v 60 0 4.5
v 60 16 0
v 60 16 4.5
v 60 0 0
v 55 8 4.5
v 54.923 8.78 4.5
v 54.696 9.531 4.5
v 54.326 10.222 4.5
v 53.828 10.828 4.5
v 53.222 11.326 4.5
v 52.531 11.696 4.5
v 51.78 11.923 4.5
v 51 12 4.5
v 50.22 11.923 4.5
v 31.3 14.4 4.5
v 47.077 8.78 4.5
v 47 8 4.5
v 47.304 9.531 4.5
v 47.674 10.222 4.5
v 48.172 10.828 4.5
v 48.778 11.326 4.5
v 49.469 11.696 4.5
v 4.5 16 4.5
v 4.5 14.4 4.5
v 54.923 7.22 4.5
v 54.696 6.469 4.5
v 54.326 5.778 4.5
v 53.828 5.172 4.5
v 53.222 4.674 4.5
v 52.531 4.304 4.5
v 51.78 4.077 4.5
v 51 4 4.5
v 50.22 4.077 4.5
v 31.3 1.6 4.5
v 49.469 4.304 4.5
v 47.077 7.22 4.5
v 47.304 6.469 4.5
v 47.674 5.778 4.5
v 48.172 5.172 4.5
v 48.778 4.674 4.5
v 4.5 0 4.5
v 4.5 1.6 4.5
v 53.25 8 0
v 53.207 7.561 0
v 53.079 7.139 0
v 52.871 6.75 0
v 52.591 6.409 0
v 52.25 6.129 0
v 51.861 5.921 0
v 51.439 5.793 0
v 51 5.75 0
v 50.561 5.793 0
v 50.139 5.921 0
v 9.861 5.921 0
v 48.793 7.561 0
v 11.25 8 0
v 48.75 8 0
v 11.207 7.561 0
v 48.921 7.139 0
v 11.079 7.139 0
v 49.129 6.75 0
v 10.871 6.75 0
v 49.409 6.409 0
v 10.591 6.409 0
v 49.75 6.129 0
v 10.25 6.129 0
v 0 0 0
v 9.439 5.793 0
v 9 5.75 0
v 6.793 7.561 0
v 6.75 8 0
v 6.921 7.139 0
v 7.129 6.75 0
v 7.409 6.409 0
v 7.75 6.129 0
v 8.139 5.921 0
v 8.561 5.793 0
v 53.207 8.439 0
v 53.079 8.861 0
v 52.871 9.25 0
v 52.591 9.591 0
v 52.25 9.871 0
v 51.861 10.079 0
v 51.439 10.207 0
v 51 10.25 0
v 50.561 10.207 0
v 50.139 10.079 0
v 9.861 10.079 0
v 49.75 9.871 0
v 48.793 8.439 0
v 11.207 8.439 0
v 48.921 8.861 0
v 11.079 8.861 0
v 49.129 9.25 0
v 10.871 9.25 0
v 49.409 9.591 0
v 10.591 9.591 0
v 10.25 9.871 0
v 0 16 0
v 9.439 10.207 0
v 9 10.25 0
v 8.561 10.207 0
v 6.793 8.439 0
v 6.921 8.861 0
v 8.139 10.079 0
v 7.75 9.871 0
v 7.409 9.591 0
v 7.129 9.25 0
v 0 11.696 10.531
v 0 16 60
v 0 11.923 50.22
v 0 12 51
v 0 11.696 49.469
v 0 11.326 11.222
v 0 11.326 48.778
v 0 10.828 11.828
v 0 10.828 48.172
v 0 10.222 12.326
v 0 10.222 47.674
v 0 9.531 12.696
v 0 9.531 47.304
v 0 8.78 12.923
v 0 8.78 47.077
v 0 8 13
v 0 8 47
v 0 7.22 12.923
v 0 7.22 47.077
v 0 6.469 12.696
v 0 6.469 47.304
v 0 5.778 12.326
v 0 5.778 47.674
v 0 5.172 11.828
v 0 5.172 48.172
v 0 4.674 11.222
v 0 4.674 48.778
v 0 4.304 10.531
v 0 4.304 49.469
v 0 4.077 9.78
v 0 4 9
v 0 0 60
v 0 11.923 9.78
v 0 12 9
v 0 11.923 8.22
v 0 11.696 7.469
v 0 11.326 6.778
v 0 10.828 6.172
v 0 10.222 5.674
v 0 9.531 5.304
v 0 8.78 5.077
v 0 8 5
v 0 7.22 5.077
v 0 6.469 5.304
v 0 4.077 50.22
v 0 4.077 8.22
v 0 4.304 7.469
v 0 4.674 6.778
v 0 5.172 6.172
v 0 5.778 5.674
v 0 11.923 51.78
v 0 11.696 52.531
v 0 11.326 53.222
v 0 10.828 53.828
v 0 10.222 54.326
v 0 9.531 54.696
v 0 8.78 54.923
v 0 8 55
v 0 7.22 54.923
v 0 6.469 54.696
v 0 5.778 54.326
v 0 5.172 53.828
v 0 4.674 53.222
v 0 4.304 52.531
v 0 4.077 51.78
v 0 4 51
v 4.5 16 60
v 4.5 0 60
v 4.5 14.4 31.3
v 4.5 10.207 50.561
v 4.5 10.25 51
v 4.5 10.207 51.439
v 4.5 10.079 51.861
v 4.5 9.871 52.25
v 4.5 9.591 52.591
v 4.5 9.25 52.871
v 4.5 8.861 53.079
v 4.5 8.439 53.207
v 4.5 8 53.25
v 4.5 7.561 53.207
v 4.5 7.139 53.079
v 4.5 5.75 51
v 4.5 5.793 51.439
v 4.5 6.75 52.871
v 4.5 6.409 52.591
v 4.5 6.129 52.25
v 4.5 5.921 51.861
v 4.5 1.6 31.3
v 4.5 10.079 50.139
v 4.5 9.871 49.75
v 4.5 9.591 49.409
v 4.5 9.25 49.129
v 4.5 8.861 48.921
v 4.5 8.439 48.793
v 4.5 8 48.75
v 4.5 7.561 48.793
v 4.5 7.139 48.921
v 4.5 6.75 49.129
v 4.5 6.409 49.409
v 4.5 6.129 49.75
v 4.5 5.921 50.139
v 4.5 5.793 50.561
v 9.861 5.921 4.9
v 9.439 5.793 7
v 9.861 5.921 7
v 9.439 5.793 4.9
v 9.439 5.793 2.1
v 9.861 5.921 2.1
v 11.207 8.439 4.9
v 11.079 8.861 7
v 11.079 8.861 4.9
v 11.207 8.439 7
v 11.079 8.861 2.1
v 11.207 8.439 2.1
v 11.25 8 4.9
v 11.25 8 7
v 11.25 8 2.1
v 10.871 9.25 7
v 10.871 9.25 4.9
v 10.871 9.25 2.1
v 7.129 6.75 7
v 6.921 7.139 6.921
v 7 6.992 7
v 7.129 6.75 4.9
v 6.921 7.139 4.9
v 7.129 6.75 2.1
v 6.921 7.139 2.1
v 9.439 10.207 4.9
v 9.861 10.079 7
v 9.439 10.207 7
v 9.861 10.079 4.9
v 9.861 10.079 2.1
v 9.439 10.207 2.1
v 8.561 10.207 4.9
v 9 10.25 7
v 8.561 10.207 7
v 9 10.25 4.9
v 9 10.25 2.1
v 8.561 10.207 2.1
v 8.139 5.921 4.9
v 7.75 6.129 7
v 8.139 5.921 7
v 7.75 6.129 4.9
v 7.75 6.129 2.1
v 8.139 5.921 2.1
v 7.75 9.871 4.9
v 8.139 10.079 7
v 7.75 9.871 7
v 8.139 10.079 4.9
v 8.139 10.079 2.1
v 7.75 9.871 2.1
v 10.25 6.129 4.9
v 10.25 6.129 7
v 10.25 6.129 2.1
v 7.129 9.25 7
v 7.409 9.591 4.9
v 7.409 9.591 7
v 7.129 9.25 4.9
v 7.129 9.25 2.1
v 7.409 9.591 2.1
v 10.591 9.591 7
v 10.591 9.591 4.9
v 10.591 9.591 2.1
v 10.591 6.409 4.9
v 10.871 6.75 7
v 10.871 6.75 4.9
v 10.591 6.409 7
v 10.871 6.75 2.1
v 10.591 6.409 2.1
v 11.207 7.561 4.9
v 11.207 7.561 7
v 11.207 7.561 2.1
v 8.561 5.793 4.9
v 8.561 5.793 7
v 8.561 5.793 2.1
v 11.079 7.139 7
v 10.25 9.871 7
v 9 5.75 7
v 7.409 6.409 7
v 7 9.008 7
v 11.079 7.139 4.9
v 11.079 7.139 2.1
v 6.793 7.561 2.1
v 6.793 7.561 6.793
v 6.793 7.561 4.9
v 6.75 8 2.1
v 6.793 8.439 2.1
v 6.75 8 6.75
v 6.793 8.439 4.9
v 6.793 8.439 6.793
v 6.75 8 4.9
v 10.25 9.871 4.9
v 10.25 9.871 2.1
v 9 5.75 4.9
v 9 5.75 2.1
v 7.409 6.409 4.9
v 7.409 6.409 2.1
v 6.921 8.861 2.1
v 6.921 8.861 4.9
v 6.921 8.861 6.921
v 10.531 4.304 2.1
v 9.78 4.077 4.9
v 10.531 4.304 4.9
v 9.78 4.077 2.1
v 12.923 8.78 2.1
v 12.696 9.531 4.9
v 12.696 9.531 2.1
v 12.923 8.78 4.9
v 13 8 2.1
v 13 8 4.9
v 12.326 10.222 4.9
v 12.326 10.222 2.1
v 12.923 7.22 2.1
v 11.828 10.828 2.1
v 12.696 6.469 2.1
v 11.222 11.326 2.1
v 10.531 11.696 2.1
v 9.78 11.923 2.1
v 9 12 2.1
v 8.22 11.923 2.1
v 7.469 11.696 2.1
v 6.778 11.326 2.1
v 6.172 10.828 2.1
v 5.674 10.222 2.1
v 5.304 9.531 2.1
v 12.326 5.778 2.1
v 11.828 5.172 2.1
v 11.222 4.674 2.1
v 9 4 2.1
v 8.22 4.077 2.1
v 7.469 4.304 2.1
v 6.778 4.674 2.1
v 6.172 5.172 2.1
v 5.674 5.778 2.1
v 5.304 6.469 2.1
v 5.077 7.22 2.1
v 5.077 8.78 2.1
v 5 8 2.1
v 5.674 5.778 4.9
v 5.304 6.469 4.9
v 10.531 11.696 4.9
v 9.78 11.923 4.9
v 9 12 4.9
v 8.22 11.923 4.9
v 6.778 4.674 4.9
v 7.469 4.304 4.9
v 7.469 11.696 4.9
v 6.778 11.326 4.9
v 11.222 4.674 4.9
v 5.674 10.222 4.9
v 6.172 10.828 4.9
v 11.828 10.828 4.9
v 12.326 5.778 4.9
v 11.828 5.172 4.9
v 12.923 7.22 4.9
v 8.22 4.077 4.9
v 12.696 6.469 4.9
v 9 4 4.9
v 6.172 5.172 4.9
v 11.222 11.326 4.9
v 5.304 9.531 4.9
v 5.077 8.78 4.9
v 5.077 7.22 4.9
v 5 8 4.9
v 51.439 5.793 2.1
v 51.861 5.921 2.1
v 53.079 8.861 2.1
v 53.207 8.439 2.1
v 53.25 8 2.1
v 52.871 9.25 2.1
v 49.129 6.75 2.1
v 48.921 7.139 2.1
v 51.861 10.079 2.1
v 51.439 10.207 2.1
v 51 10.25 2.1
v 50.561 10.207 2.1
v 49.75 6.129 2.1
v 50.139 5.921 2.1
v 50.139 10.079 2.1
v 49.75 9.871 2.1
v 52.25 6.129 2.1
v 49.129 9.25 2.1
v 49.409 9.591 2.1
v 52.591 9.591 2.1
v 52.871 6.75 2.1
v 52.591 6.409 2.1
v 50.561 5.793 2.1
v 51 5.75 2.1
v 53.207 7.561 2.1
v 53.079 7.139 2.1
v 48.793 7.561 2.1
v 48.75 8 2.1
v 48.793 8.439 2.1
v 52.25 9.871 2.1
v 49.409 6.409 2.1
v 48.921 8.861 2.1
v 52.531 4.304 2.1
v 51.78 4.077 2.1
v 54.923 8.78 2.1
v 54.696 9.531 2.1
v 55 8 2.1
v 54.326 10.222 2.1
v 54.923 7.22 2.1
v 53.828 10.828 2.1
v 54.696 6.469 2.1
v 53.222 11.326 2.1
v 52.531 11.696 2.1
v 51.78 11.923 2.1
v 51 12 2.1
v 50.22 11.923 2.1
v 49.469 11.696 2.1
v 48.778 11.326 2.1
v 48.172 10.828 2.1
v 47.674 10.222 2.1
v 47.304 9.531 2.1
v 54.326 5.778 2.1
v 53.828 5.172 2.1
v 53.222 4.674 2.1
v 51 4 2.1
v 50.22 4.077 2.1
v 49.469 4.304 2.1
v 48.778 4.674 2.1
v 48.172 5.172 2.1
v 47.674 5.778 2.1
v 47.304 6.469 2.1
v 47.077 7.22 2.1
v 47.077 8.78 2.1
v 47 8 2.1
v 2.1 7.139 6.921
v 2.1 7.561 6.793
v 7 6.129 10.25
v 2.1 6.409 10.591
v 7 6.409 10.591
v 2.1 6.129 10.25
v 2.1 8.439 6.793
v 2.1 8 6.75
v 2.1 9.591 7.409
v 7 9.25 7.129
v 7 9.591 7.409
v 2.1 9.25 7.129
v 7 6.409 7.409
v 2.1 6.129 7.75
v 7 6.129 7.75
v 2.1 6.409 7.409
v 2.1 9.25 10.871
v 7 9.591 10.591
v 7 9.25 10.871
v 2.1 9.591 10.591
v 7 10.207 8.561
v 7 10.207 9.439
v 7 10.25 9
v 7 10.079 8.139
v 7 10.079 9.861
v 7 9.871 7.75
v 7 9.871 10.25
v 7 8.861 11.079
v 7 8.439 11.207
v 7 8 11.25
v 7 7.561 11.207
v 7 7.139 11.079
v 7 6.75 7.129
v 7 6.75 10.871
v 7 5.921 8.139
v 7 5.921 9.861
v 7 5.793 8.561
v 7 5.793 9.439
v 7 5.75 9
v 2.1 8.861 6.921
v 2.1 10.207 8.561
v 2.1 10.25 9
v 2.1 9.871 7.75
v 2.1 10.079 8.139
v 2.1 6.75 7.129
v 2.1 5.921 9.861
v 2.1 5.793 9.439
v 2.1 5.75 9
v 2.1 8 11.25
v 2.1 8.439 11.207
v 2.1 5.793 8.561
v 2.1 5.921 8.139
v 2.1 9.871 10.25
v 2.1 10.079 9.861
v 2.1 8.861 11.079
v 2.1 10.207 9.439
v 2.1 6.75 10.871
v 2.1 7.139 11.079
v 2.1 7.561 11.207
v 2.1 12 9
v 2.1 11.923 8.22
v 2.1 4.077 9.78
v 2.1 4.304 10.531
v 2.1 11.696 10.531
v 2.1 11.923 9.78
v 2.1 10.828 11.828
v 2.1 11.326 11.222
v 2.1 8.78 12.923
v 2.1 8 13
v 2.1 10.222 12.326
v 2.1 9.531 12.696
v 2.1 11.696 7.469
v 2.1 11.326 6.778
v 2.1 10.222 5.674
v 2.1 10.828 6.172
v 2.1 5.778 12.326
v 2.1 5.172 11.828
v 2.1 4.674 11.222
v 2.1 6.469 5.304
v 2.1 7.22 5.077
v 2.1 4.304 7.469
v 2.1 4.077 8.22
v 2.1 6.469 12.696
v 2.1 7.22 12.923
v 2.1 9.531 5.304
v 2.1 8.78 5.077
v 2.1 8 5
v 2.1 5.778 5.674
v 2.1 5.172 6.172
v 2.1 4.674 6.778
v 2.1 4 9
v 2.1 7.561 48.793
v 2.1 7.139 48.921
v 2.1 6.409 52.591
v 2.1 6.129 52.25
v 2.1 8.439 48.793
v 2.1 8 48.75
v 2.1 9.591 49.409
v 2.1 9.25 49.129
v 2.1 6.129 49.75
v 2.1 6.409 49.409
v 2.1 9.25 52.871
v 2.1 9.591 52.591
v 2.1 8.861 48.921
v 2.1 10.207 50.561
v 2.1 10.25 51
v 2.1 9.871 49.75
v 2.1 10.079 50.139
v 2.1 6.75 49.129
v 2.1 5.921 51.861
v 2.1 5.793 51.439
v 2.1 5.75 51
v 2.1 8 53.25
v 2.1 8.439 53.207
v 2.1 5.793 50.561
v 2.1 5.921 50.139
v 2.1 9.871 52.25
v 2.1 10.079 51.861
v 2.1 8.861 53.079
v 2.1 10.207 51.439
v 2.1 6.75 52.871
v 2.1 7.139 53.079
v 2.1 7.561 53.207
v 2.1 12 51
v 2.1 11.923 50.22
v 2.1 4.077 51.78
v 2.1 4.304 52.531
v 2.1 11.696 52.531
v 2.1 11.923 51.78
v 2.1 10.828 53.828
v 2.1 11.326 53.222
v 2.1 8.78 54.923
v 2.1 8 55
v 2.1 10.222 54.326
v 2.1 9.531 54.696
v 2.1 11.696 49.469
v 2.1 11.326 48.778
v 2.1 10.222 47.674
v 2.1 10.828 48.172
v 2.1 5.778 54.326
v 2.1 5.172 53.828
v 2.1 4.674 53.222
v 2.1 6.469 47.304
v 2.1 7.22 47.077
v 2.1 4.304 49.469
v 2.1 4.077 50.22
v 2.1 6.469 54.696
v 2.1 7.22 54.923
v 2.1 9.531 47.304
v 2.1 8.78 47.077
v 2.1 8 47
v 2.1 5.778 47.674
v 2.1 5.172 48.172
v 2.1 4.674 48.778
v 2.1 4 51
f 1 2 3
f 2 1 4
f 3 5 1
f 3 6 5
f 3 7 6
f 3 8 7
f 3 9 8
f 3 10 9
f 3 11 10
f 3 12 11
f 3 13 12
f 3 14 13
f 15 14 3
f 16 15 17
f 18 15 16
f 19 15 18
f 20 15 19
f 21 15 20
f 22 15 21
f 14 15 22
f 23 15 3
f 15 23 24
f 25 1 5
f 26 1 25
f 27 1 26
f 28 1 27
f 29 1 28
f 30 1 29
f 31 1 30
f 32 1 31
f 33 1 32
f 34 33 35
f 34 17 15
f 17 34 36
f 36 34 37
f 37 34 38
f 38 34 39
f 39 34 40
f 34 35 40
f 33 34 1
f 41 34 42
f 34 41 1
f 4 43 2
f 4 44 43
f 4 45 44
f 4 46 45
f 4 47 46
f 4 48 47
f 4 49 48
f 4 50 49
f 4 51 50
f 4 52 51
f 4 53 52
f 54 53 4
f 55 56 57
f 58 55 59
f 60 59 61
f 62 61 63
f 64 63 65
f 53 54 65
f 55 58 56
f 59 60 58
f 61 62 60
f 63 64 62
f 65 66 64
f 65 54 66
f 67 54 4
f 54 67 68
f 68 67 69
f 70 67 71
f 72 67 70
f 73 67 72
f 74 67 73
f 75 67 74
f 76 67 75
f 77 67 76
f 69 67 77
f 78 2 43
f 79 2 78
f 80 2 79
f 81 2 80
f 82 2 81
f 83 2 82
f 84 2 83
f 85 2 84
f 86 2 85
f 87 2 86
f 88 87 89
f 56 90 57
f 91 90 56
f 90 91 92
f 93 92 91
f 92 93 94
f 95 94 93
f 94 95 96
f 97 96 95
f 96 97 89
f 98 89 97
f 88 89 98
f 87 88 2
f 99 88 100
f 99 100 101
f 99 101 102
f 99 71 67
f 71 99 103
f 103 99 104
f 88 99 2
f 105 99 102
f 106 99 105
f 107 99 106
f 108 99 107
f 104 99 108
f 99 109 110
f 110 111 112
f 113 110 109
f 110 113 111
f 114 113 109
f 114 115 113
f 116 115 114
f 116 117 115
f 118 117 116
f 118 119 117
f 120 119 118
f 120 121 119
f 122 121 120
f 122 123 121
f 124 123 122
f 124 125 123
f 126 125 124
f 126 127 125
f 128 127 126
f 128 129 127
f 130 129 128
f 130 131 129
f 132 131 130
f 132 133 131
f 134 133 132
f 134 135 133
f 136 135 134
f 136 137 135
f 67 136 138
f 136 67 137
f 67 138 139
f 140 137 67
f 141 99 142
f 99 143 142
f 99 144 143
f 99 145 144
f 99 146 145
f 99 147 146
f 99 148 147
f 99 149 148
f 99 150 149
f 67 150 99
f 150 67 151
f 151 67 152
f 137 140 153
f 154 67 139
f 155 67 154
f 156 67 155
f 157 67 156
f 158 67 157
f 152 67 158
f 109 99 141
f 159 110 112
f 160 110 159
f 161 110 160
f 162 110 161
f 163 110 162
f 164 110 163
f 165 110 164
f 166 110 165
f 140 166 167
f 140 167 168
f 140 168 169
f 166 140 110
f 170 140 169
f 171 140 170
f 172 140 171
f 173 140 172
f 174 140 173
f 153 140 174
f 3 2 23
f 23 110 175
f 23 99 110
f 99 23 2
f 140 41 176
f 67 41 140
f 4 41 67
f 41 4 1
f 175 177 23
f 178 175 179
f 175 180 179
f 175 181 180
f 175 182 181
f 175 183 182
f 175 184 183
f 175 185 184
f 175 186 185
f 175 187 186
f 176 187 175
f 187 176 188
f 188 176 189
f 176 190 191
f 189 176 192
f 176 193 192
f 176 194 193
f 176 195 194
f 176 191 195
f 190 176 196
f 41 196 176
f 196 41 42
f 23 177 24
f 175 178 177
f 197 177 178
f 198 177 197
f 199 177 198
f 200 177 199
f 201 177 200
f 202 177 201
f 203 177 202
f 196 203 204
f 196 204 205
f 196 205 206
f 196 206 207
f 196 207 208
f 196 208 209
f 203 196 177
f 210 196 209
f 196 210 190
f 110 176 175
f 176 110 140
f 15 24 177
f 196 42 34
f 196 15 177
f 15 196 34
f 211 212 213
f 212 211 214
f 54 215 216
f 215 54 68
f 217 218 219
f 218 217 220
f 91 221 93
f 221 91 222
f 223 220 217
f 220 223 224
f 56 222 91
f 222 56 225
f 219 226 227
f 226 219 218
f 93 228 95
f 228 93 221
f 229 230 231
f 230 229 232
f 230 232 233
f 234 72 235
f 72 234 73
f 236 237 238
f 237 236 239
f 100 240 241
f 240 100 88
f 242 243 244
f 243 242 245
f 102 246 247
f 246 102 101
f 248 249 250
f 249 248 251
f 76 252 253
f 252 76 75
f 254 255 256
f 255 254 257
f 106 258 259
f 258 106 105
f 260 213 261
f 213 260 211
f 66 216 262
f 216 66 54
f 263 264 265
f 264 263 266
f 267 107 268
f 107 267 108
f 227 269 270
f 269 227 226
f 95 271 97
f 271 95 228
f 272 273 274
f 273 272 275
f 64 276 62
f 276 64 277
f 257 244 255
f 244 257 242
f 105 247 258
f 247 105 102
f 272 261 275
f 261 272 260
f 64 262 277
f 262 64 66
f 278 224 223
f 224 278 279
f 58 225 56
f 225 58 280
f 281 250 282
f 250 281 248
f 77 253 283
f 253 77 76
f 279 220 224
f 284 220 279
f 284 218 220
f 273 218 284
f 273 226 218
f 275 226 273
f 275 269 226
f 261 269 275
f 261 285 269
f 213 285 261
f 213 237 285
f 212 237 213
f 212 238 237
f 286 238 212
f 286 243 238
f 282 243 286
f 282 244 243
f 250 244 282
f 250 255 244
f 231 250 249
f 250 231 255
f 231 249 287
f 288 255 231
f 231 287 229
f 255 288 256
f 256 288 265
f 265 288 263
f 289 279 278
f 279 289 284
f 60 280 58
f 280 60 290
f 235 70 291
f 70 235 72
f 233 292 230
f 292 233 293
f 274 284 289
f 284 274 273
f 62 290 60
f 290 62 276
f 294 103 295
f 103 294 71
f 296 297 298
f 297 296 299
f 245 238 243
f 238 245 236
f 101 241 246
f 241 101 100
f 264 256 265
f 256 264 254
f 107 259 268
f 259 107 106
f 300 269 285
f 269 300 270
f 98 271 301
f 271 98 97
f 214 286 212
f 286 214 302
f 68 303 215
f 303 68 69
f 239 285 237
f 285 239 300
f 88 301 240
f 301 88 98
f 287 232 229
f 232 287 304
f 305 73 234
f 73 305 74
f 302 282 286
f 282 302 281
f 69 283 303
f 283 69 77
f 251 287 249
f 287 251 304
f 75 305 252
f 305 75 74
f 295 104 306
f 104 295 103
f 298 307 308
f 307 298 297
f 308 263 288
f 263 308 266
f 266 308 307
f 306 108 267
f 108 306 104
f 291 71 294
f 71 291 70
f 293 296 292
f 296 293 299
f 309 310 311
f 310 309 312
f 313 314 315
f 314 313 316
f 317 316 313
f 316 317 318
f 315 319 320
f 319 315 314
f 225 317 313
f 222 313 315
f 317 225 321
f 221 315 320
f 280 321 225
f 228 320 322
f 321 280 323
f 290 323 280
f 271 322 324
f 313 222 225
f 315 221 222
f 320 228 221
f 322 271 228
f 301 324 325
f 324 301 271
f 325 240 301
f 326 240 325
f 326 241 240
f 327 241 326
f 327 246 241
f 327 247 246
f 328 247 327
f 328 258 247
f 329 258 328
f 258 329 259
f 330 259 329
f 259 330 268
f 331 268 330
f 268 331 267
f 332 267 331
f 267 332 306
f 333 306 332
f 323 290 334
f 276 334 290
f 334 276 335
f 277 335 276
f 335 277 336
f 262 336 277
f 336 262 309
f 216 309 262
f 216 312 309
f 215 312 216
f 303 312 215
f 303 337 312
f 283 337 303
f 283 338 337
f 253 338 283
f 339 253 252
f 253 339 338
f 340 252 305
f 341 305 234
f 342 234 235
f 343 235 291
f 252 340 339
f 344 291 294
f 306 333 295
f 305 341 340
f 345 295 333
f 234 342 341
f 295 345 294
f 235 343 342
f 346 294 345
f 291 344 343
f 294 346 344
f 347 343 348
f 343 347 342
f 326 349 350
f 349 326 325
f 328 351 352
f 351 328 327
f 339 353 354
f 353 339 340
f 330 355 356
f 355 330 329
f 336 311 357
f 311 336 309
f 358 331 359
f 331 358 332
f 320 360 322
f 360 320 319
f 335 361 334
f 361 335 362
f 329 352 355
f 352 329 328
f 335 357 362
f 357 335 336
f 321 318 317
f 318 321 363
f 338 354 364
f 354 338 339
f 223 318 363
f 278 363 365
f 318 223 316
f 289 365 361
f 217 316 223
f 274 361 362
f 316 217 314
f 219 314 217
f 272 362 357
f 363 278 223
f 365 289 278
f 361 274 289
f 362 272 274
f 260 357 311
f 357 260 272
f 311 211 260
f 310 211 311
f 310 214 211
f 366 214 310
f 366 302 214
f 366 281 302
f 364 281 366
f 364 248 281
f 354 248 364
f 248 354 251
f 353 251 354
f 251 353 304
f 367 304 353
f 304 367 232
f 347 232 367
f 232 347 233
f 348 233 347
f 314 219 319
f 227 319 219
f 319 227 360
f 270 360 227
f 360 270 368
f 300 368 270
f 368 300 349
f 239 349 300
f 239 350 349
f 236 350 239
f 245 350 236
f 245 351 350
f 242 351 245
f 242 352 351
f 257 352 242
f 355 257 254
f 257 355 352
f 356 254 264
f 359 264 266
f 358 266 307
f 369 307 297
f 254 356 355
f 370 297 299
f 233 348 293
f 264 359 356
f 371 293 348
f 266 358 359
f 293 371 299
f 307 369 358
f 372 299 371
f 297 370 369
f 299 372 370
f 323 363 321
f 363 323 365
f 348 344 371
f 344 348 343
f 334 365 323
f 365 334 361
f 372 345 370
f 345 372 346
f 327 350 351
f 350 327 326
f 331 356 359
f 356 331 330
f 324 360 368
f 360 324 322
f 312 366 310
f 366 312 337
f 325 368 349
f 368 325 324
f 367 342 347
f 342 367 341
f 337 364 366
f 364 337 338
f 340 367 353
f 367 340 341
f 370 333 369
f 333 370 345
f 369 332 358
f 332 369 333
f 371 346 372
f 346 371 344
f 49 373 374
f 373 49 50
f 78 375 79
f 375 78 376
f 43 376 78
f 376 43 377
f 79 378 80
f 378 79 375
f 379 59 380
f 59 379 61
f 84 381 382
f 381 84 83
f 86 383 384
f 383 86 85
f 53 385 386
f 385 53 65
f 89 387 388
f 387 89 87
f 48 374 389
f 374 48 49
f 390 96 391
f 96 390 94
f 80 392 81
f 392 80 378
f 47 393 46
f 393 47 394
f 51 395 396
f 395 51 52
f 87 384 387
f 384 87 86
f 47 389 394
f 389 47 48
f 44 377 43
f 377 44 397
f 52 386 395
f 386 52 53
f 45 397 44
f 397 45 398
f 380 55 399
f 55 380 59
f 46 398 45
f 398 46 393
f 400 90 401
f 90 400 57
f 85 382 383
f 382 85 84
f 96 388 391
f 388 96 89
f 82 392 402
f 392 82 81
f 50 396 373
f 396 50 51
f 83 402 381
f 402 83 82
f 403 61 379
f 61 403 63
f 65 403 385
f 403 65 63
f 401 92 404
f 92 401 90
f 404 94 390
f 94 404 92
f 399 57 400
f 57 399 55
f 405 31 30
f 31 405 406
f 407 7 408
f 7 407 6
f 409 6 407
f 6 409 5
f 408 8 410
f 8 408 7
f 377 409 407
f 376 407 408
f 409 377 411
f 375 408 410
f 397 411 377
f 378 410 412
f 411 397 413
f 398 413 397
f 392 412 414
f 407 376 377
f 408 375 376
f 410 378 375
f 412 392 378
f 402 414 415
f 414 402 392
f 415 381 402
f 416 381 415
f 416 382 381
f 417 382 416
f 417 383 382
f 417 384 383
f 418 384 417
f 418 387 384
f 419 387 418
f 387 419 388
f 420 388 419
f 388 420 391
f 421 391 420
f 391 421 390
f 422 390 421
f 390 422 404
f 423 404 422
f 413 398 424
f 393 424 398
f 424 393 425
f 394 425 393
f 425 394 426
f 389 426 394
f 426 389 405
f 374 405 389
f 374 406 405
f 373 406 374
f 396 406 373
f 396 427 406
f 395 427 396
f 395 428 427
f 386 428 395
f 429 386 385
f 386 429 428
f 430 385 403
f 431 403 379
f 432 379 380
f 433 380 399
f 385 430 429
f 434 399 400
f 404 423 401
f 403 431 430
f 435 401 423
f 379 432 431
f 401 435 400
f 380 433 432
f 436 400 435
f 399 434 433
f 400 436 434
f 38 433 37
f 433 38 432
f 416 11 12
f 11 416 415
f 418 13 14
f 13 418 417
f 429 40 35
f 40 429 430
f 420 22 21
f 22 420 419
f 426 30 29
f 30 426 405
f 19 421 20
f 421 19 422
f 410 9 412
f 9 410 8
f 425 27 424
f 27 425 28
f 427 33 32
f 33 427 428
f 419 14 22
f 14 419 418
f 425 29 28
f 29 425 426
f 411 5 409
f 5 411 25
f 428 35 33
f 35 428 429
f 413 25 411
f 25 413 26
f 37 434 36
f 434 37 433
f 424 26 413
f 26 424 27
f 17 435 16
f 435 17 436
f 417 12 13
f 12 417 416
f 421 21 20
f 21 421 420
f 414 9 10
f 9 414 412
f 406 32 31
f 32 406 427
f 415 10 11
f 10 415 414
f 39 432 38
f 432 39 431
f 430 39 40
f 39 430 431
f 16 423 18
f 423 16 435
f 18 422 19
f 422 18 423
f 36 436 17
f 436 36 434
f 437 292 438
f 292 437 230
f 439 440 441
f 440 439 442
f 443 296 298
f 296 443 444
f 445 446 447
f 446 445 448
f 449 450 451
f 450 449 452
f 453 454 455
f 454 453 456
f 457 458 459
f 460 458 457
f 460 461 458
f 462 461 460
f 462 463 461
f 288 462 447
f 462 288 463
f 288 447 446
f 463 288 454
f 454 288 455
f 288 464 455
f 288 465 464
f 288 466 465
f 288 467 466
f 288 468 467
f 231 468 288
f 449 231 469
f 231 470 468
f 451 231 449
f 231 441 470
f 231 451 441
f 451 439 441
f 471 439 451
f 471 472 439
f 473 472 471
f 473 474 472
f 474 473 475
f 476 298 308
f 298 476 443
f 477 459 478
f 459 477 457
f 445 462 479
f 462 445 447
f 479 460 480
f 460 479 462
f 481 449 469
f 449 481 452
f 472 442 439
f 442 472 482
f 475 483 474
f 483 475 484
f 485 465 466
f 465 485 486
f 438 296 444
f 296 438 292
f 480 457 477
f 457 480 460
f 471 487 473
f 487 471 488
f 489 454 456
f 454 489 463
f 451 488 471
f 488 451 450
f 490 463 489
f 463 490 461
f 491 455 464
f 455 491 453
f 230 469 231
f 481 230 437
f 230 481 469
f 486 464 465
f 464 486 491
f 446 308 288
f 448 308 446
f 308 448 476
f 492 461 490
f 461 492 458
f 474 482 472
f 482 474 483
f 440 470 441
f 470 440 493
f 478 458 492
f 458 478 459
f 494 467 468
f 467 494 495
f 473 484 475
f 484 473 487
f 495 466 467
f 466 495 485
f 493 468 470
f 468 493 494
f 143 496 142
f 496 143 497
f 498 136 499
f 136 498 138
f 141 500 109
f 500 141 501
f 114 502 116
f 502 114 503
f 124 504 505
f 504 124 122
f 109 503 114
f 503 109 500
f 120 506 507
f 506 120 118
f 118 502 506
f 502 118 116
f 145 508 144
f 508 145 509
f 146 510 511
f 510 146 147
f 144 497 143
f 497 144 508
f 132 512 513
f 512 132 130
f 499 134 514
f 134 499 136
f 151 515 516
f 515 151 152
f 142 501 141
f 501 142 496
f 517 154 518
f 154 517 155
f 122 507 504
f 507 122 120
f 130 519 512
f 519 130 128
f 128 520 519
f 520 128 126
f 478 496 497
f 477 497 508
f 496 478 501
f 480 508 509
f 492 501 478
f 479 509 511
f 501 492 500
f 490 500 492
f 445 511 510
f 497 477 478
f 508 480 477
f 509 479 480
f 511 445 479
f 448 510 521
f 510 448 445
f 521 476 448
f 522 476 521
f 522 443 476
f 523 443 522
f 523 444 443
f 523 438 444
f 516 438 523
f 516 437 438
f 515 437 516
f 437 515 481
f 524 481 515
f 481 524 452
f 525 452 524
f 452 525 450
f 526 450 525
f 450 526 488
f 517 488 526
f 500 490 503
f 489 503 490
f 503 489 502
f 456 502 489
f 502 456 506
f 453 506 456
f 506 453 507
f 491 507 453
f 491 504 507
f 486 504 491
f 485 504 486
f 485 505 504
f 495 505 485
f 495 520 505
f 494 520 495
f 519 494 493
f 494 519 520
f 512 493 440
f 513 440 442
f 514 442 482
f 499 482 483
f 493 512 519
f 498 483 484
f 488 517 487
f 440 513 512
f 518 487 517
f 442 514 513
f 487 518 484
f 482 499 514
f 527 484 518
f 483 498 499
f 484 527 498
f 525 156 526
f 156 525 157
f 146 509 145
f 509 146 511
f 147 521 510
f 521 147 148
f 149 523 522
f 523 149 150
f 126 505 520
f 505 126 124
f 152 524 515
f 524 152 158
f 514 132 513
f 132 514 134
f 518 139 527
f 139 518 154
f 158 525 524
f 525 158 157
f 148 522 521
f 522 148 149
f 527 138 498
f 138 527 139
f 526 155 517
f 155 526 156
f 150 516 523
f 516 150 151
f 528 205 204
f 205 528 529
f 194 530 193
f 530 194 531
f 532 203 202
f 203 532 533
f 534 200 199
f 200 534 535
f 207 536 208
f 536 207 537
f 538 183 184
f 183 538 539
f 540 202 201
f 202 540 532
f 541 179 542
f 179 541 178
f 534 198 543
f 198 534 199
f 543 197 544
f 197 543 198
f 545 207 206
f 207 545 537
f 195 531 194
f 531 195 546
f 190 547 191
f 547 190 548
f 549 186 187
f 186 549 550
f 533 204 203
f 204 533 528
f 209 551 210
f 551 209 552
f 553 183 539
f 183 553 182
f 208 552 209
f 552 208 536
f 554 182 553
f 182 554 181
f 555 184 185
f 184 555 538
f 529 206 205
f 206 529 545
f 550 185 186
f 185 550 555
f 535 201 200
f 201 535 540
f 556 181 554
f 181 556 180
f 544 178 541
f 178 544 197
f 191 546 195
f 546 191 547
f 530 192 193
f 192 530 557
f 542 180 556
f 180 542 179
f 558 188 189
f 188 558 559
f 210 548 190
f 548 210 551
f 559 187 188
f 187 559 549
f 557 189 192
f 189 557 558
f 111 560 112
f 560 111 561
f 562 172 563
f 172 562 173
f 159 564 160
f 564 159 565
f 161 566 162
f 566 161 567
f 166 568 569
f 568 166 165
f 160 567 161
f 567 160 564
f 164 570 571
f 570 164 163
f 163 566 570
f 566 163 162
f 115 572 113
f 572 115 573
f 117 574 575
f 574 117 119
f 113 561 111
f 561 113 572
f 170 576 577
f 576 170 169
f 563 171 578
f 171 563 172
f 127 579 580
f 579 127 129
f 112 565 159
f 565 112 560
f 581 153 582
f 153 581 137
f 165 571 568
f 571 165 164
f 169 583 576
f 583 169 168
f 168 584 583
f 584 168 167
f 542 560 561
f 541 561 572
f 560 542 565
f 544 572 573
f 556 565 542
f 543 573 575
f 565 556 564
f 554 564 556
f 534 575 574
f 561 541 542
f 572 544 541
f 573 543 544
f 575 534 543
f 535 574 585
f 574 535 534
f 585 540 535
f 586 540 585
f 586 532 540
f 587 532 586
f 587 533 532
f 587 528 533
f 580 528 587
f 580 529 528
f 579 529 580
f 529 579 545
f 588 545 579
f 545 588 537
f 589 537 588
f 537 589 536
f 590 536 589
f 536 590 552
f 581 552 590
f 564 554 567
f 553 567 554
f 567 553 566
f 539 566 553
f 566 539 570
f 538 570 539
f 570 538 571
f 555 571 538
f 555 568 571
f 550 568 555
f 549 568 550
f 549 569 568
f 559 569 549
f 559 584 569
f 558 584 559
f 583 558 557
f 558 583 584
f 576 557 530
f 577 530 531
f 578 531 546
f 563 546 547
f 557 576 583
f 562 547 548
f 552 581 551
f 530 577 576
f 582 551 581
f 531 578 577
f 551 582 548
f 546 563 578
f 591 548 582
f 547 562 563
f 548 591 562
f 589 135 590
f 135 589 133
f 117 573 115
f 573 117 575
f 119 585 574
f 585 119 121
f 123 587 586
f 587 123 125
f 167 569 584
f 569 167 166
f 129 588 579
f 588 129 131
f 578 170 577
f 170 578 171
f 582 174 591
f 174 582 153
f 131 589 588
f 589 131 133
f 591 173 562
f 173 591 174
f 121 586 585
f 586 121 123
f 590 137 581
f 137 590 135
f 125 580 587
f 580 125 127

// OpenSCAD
$fn = 32;

// ----------------------------------------------------------------------
// L-bracket: 60 x 16 x 60 mm
// ----------------------------------------------------------------------

// --- parameters (mm) ---
base_len = 60;            // horizontal leg, X
upright_h = 60;           // vertical leg, Z
flange_w = 16;            // bracket depth, Y
mat_t = 4.5;              // plate thickness
hole_d = 4.5;             // clearance for M4
cb_d = 8;                 // counterbore seat
cb_h = 2.4;               // counterbore depth
rib_leg = 34.2;           // gusset leg
rib_sink = 1.6;           // gusset overlap into the plates

module hole_z(px, py) {
  translate([px, py, -2.5]) cylinder(h = mat_t + 5, d = hole_d);
}
module hole_x(pz, py) {
  translate([-2.5, py, pz]) rotate([0, 90, 0]) cylinder(h = mat_t + 5, d = hole_d);
}
module cb_z(px, py) {
  translate([px, py, mat_t - cb_h]) cylinder(h = cb_h + 0.4, d = cb_d);
}
module cb_x(pz, py) {
  translate([mat_t - cb_h, py, pz]) rotate([0, -90, 0]) cylinder(h = cb_h + 0.4, d = cb_d);
}
module gusset() {
  translate([0, flange_w - rib_sink, 0])
    rotate([90, 0, 0])
      linear_extrude(height = flange_w - 2 * rib_sink)
        polygon(points = [[rib_sink, rib_sink], [rib_leg, rib_sink], [rib_sink, rib_leg]]);
}

difference() {
  union() {
    /* horizontal leg */
    cube([base_len, flange_w, mat_t]);
    /* vertical leg, overlapping the corner block */
    cube([mat_t, flange_w, upright_h]);
    gusset();
  }
  hole_z(9, 8);
  cb_z(9, 8);
  hole_z(51, 8);
  cb_z(51, 8);
  hole_x(9, 8);
  cb_x(9, 8);
  hole_x(51, 8);
  cb_x(51, 8);
}
